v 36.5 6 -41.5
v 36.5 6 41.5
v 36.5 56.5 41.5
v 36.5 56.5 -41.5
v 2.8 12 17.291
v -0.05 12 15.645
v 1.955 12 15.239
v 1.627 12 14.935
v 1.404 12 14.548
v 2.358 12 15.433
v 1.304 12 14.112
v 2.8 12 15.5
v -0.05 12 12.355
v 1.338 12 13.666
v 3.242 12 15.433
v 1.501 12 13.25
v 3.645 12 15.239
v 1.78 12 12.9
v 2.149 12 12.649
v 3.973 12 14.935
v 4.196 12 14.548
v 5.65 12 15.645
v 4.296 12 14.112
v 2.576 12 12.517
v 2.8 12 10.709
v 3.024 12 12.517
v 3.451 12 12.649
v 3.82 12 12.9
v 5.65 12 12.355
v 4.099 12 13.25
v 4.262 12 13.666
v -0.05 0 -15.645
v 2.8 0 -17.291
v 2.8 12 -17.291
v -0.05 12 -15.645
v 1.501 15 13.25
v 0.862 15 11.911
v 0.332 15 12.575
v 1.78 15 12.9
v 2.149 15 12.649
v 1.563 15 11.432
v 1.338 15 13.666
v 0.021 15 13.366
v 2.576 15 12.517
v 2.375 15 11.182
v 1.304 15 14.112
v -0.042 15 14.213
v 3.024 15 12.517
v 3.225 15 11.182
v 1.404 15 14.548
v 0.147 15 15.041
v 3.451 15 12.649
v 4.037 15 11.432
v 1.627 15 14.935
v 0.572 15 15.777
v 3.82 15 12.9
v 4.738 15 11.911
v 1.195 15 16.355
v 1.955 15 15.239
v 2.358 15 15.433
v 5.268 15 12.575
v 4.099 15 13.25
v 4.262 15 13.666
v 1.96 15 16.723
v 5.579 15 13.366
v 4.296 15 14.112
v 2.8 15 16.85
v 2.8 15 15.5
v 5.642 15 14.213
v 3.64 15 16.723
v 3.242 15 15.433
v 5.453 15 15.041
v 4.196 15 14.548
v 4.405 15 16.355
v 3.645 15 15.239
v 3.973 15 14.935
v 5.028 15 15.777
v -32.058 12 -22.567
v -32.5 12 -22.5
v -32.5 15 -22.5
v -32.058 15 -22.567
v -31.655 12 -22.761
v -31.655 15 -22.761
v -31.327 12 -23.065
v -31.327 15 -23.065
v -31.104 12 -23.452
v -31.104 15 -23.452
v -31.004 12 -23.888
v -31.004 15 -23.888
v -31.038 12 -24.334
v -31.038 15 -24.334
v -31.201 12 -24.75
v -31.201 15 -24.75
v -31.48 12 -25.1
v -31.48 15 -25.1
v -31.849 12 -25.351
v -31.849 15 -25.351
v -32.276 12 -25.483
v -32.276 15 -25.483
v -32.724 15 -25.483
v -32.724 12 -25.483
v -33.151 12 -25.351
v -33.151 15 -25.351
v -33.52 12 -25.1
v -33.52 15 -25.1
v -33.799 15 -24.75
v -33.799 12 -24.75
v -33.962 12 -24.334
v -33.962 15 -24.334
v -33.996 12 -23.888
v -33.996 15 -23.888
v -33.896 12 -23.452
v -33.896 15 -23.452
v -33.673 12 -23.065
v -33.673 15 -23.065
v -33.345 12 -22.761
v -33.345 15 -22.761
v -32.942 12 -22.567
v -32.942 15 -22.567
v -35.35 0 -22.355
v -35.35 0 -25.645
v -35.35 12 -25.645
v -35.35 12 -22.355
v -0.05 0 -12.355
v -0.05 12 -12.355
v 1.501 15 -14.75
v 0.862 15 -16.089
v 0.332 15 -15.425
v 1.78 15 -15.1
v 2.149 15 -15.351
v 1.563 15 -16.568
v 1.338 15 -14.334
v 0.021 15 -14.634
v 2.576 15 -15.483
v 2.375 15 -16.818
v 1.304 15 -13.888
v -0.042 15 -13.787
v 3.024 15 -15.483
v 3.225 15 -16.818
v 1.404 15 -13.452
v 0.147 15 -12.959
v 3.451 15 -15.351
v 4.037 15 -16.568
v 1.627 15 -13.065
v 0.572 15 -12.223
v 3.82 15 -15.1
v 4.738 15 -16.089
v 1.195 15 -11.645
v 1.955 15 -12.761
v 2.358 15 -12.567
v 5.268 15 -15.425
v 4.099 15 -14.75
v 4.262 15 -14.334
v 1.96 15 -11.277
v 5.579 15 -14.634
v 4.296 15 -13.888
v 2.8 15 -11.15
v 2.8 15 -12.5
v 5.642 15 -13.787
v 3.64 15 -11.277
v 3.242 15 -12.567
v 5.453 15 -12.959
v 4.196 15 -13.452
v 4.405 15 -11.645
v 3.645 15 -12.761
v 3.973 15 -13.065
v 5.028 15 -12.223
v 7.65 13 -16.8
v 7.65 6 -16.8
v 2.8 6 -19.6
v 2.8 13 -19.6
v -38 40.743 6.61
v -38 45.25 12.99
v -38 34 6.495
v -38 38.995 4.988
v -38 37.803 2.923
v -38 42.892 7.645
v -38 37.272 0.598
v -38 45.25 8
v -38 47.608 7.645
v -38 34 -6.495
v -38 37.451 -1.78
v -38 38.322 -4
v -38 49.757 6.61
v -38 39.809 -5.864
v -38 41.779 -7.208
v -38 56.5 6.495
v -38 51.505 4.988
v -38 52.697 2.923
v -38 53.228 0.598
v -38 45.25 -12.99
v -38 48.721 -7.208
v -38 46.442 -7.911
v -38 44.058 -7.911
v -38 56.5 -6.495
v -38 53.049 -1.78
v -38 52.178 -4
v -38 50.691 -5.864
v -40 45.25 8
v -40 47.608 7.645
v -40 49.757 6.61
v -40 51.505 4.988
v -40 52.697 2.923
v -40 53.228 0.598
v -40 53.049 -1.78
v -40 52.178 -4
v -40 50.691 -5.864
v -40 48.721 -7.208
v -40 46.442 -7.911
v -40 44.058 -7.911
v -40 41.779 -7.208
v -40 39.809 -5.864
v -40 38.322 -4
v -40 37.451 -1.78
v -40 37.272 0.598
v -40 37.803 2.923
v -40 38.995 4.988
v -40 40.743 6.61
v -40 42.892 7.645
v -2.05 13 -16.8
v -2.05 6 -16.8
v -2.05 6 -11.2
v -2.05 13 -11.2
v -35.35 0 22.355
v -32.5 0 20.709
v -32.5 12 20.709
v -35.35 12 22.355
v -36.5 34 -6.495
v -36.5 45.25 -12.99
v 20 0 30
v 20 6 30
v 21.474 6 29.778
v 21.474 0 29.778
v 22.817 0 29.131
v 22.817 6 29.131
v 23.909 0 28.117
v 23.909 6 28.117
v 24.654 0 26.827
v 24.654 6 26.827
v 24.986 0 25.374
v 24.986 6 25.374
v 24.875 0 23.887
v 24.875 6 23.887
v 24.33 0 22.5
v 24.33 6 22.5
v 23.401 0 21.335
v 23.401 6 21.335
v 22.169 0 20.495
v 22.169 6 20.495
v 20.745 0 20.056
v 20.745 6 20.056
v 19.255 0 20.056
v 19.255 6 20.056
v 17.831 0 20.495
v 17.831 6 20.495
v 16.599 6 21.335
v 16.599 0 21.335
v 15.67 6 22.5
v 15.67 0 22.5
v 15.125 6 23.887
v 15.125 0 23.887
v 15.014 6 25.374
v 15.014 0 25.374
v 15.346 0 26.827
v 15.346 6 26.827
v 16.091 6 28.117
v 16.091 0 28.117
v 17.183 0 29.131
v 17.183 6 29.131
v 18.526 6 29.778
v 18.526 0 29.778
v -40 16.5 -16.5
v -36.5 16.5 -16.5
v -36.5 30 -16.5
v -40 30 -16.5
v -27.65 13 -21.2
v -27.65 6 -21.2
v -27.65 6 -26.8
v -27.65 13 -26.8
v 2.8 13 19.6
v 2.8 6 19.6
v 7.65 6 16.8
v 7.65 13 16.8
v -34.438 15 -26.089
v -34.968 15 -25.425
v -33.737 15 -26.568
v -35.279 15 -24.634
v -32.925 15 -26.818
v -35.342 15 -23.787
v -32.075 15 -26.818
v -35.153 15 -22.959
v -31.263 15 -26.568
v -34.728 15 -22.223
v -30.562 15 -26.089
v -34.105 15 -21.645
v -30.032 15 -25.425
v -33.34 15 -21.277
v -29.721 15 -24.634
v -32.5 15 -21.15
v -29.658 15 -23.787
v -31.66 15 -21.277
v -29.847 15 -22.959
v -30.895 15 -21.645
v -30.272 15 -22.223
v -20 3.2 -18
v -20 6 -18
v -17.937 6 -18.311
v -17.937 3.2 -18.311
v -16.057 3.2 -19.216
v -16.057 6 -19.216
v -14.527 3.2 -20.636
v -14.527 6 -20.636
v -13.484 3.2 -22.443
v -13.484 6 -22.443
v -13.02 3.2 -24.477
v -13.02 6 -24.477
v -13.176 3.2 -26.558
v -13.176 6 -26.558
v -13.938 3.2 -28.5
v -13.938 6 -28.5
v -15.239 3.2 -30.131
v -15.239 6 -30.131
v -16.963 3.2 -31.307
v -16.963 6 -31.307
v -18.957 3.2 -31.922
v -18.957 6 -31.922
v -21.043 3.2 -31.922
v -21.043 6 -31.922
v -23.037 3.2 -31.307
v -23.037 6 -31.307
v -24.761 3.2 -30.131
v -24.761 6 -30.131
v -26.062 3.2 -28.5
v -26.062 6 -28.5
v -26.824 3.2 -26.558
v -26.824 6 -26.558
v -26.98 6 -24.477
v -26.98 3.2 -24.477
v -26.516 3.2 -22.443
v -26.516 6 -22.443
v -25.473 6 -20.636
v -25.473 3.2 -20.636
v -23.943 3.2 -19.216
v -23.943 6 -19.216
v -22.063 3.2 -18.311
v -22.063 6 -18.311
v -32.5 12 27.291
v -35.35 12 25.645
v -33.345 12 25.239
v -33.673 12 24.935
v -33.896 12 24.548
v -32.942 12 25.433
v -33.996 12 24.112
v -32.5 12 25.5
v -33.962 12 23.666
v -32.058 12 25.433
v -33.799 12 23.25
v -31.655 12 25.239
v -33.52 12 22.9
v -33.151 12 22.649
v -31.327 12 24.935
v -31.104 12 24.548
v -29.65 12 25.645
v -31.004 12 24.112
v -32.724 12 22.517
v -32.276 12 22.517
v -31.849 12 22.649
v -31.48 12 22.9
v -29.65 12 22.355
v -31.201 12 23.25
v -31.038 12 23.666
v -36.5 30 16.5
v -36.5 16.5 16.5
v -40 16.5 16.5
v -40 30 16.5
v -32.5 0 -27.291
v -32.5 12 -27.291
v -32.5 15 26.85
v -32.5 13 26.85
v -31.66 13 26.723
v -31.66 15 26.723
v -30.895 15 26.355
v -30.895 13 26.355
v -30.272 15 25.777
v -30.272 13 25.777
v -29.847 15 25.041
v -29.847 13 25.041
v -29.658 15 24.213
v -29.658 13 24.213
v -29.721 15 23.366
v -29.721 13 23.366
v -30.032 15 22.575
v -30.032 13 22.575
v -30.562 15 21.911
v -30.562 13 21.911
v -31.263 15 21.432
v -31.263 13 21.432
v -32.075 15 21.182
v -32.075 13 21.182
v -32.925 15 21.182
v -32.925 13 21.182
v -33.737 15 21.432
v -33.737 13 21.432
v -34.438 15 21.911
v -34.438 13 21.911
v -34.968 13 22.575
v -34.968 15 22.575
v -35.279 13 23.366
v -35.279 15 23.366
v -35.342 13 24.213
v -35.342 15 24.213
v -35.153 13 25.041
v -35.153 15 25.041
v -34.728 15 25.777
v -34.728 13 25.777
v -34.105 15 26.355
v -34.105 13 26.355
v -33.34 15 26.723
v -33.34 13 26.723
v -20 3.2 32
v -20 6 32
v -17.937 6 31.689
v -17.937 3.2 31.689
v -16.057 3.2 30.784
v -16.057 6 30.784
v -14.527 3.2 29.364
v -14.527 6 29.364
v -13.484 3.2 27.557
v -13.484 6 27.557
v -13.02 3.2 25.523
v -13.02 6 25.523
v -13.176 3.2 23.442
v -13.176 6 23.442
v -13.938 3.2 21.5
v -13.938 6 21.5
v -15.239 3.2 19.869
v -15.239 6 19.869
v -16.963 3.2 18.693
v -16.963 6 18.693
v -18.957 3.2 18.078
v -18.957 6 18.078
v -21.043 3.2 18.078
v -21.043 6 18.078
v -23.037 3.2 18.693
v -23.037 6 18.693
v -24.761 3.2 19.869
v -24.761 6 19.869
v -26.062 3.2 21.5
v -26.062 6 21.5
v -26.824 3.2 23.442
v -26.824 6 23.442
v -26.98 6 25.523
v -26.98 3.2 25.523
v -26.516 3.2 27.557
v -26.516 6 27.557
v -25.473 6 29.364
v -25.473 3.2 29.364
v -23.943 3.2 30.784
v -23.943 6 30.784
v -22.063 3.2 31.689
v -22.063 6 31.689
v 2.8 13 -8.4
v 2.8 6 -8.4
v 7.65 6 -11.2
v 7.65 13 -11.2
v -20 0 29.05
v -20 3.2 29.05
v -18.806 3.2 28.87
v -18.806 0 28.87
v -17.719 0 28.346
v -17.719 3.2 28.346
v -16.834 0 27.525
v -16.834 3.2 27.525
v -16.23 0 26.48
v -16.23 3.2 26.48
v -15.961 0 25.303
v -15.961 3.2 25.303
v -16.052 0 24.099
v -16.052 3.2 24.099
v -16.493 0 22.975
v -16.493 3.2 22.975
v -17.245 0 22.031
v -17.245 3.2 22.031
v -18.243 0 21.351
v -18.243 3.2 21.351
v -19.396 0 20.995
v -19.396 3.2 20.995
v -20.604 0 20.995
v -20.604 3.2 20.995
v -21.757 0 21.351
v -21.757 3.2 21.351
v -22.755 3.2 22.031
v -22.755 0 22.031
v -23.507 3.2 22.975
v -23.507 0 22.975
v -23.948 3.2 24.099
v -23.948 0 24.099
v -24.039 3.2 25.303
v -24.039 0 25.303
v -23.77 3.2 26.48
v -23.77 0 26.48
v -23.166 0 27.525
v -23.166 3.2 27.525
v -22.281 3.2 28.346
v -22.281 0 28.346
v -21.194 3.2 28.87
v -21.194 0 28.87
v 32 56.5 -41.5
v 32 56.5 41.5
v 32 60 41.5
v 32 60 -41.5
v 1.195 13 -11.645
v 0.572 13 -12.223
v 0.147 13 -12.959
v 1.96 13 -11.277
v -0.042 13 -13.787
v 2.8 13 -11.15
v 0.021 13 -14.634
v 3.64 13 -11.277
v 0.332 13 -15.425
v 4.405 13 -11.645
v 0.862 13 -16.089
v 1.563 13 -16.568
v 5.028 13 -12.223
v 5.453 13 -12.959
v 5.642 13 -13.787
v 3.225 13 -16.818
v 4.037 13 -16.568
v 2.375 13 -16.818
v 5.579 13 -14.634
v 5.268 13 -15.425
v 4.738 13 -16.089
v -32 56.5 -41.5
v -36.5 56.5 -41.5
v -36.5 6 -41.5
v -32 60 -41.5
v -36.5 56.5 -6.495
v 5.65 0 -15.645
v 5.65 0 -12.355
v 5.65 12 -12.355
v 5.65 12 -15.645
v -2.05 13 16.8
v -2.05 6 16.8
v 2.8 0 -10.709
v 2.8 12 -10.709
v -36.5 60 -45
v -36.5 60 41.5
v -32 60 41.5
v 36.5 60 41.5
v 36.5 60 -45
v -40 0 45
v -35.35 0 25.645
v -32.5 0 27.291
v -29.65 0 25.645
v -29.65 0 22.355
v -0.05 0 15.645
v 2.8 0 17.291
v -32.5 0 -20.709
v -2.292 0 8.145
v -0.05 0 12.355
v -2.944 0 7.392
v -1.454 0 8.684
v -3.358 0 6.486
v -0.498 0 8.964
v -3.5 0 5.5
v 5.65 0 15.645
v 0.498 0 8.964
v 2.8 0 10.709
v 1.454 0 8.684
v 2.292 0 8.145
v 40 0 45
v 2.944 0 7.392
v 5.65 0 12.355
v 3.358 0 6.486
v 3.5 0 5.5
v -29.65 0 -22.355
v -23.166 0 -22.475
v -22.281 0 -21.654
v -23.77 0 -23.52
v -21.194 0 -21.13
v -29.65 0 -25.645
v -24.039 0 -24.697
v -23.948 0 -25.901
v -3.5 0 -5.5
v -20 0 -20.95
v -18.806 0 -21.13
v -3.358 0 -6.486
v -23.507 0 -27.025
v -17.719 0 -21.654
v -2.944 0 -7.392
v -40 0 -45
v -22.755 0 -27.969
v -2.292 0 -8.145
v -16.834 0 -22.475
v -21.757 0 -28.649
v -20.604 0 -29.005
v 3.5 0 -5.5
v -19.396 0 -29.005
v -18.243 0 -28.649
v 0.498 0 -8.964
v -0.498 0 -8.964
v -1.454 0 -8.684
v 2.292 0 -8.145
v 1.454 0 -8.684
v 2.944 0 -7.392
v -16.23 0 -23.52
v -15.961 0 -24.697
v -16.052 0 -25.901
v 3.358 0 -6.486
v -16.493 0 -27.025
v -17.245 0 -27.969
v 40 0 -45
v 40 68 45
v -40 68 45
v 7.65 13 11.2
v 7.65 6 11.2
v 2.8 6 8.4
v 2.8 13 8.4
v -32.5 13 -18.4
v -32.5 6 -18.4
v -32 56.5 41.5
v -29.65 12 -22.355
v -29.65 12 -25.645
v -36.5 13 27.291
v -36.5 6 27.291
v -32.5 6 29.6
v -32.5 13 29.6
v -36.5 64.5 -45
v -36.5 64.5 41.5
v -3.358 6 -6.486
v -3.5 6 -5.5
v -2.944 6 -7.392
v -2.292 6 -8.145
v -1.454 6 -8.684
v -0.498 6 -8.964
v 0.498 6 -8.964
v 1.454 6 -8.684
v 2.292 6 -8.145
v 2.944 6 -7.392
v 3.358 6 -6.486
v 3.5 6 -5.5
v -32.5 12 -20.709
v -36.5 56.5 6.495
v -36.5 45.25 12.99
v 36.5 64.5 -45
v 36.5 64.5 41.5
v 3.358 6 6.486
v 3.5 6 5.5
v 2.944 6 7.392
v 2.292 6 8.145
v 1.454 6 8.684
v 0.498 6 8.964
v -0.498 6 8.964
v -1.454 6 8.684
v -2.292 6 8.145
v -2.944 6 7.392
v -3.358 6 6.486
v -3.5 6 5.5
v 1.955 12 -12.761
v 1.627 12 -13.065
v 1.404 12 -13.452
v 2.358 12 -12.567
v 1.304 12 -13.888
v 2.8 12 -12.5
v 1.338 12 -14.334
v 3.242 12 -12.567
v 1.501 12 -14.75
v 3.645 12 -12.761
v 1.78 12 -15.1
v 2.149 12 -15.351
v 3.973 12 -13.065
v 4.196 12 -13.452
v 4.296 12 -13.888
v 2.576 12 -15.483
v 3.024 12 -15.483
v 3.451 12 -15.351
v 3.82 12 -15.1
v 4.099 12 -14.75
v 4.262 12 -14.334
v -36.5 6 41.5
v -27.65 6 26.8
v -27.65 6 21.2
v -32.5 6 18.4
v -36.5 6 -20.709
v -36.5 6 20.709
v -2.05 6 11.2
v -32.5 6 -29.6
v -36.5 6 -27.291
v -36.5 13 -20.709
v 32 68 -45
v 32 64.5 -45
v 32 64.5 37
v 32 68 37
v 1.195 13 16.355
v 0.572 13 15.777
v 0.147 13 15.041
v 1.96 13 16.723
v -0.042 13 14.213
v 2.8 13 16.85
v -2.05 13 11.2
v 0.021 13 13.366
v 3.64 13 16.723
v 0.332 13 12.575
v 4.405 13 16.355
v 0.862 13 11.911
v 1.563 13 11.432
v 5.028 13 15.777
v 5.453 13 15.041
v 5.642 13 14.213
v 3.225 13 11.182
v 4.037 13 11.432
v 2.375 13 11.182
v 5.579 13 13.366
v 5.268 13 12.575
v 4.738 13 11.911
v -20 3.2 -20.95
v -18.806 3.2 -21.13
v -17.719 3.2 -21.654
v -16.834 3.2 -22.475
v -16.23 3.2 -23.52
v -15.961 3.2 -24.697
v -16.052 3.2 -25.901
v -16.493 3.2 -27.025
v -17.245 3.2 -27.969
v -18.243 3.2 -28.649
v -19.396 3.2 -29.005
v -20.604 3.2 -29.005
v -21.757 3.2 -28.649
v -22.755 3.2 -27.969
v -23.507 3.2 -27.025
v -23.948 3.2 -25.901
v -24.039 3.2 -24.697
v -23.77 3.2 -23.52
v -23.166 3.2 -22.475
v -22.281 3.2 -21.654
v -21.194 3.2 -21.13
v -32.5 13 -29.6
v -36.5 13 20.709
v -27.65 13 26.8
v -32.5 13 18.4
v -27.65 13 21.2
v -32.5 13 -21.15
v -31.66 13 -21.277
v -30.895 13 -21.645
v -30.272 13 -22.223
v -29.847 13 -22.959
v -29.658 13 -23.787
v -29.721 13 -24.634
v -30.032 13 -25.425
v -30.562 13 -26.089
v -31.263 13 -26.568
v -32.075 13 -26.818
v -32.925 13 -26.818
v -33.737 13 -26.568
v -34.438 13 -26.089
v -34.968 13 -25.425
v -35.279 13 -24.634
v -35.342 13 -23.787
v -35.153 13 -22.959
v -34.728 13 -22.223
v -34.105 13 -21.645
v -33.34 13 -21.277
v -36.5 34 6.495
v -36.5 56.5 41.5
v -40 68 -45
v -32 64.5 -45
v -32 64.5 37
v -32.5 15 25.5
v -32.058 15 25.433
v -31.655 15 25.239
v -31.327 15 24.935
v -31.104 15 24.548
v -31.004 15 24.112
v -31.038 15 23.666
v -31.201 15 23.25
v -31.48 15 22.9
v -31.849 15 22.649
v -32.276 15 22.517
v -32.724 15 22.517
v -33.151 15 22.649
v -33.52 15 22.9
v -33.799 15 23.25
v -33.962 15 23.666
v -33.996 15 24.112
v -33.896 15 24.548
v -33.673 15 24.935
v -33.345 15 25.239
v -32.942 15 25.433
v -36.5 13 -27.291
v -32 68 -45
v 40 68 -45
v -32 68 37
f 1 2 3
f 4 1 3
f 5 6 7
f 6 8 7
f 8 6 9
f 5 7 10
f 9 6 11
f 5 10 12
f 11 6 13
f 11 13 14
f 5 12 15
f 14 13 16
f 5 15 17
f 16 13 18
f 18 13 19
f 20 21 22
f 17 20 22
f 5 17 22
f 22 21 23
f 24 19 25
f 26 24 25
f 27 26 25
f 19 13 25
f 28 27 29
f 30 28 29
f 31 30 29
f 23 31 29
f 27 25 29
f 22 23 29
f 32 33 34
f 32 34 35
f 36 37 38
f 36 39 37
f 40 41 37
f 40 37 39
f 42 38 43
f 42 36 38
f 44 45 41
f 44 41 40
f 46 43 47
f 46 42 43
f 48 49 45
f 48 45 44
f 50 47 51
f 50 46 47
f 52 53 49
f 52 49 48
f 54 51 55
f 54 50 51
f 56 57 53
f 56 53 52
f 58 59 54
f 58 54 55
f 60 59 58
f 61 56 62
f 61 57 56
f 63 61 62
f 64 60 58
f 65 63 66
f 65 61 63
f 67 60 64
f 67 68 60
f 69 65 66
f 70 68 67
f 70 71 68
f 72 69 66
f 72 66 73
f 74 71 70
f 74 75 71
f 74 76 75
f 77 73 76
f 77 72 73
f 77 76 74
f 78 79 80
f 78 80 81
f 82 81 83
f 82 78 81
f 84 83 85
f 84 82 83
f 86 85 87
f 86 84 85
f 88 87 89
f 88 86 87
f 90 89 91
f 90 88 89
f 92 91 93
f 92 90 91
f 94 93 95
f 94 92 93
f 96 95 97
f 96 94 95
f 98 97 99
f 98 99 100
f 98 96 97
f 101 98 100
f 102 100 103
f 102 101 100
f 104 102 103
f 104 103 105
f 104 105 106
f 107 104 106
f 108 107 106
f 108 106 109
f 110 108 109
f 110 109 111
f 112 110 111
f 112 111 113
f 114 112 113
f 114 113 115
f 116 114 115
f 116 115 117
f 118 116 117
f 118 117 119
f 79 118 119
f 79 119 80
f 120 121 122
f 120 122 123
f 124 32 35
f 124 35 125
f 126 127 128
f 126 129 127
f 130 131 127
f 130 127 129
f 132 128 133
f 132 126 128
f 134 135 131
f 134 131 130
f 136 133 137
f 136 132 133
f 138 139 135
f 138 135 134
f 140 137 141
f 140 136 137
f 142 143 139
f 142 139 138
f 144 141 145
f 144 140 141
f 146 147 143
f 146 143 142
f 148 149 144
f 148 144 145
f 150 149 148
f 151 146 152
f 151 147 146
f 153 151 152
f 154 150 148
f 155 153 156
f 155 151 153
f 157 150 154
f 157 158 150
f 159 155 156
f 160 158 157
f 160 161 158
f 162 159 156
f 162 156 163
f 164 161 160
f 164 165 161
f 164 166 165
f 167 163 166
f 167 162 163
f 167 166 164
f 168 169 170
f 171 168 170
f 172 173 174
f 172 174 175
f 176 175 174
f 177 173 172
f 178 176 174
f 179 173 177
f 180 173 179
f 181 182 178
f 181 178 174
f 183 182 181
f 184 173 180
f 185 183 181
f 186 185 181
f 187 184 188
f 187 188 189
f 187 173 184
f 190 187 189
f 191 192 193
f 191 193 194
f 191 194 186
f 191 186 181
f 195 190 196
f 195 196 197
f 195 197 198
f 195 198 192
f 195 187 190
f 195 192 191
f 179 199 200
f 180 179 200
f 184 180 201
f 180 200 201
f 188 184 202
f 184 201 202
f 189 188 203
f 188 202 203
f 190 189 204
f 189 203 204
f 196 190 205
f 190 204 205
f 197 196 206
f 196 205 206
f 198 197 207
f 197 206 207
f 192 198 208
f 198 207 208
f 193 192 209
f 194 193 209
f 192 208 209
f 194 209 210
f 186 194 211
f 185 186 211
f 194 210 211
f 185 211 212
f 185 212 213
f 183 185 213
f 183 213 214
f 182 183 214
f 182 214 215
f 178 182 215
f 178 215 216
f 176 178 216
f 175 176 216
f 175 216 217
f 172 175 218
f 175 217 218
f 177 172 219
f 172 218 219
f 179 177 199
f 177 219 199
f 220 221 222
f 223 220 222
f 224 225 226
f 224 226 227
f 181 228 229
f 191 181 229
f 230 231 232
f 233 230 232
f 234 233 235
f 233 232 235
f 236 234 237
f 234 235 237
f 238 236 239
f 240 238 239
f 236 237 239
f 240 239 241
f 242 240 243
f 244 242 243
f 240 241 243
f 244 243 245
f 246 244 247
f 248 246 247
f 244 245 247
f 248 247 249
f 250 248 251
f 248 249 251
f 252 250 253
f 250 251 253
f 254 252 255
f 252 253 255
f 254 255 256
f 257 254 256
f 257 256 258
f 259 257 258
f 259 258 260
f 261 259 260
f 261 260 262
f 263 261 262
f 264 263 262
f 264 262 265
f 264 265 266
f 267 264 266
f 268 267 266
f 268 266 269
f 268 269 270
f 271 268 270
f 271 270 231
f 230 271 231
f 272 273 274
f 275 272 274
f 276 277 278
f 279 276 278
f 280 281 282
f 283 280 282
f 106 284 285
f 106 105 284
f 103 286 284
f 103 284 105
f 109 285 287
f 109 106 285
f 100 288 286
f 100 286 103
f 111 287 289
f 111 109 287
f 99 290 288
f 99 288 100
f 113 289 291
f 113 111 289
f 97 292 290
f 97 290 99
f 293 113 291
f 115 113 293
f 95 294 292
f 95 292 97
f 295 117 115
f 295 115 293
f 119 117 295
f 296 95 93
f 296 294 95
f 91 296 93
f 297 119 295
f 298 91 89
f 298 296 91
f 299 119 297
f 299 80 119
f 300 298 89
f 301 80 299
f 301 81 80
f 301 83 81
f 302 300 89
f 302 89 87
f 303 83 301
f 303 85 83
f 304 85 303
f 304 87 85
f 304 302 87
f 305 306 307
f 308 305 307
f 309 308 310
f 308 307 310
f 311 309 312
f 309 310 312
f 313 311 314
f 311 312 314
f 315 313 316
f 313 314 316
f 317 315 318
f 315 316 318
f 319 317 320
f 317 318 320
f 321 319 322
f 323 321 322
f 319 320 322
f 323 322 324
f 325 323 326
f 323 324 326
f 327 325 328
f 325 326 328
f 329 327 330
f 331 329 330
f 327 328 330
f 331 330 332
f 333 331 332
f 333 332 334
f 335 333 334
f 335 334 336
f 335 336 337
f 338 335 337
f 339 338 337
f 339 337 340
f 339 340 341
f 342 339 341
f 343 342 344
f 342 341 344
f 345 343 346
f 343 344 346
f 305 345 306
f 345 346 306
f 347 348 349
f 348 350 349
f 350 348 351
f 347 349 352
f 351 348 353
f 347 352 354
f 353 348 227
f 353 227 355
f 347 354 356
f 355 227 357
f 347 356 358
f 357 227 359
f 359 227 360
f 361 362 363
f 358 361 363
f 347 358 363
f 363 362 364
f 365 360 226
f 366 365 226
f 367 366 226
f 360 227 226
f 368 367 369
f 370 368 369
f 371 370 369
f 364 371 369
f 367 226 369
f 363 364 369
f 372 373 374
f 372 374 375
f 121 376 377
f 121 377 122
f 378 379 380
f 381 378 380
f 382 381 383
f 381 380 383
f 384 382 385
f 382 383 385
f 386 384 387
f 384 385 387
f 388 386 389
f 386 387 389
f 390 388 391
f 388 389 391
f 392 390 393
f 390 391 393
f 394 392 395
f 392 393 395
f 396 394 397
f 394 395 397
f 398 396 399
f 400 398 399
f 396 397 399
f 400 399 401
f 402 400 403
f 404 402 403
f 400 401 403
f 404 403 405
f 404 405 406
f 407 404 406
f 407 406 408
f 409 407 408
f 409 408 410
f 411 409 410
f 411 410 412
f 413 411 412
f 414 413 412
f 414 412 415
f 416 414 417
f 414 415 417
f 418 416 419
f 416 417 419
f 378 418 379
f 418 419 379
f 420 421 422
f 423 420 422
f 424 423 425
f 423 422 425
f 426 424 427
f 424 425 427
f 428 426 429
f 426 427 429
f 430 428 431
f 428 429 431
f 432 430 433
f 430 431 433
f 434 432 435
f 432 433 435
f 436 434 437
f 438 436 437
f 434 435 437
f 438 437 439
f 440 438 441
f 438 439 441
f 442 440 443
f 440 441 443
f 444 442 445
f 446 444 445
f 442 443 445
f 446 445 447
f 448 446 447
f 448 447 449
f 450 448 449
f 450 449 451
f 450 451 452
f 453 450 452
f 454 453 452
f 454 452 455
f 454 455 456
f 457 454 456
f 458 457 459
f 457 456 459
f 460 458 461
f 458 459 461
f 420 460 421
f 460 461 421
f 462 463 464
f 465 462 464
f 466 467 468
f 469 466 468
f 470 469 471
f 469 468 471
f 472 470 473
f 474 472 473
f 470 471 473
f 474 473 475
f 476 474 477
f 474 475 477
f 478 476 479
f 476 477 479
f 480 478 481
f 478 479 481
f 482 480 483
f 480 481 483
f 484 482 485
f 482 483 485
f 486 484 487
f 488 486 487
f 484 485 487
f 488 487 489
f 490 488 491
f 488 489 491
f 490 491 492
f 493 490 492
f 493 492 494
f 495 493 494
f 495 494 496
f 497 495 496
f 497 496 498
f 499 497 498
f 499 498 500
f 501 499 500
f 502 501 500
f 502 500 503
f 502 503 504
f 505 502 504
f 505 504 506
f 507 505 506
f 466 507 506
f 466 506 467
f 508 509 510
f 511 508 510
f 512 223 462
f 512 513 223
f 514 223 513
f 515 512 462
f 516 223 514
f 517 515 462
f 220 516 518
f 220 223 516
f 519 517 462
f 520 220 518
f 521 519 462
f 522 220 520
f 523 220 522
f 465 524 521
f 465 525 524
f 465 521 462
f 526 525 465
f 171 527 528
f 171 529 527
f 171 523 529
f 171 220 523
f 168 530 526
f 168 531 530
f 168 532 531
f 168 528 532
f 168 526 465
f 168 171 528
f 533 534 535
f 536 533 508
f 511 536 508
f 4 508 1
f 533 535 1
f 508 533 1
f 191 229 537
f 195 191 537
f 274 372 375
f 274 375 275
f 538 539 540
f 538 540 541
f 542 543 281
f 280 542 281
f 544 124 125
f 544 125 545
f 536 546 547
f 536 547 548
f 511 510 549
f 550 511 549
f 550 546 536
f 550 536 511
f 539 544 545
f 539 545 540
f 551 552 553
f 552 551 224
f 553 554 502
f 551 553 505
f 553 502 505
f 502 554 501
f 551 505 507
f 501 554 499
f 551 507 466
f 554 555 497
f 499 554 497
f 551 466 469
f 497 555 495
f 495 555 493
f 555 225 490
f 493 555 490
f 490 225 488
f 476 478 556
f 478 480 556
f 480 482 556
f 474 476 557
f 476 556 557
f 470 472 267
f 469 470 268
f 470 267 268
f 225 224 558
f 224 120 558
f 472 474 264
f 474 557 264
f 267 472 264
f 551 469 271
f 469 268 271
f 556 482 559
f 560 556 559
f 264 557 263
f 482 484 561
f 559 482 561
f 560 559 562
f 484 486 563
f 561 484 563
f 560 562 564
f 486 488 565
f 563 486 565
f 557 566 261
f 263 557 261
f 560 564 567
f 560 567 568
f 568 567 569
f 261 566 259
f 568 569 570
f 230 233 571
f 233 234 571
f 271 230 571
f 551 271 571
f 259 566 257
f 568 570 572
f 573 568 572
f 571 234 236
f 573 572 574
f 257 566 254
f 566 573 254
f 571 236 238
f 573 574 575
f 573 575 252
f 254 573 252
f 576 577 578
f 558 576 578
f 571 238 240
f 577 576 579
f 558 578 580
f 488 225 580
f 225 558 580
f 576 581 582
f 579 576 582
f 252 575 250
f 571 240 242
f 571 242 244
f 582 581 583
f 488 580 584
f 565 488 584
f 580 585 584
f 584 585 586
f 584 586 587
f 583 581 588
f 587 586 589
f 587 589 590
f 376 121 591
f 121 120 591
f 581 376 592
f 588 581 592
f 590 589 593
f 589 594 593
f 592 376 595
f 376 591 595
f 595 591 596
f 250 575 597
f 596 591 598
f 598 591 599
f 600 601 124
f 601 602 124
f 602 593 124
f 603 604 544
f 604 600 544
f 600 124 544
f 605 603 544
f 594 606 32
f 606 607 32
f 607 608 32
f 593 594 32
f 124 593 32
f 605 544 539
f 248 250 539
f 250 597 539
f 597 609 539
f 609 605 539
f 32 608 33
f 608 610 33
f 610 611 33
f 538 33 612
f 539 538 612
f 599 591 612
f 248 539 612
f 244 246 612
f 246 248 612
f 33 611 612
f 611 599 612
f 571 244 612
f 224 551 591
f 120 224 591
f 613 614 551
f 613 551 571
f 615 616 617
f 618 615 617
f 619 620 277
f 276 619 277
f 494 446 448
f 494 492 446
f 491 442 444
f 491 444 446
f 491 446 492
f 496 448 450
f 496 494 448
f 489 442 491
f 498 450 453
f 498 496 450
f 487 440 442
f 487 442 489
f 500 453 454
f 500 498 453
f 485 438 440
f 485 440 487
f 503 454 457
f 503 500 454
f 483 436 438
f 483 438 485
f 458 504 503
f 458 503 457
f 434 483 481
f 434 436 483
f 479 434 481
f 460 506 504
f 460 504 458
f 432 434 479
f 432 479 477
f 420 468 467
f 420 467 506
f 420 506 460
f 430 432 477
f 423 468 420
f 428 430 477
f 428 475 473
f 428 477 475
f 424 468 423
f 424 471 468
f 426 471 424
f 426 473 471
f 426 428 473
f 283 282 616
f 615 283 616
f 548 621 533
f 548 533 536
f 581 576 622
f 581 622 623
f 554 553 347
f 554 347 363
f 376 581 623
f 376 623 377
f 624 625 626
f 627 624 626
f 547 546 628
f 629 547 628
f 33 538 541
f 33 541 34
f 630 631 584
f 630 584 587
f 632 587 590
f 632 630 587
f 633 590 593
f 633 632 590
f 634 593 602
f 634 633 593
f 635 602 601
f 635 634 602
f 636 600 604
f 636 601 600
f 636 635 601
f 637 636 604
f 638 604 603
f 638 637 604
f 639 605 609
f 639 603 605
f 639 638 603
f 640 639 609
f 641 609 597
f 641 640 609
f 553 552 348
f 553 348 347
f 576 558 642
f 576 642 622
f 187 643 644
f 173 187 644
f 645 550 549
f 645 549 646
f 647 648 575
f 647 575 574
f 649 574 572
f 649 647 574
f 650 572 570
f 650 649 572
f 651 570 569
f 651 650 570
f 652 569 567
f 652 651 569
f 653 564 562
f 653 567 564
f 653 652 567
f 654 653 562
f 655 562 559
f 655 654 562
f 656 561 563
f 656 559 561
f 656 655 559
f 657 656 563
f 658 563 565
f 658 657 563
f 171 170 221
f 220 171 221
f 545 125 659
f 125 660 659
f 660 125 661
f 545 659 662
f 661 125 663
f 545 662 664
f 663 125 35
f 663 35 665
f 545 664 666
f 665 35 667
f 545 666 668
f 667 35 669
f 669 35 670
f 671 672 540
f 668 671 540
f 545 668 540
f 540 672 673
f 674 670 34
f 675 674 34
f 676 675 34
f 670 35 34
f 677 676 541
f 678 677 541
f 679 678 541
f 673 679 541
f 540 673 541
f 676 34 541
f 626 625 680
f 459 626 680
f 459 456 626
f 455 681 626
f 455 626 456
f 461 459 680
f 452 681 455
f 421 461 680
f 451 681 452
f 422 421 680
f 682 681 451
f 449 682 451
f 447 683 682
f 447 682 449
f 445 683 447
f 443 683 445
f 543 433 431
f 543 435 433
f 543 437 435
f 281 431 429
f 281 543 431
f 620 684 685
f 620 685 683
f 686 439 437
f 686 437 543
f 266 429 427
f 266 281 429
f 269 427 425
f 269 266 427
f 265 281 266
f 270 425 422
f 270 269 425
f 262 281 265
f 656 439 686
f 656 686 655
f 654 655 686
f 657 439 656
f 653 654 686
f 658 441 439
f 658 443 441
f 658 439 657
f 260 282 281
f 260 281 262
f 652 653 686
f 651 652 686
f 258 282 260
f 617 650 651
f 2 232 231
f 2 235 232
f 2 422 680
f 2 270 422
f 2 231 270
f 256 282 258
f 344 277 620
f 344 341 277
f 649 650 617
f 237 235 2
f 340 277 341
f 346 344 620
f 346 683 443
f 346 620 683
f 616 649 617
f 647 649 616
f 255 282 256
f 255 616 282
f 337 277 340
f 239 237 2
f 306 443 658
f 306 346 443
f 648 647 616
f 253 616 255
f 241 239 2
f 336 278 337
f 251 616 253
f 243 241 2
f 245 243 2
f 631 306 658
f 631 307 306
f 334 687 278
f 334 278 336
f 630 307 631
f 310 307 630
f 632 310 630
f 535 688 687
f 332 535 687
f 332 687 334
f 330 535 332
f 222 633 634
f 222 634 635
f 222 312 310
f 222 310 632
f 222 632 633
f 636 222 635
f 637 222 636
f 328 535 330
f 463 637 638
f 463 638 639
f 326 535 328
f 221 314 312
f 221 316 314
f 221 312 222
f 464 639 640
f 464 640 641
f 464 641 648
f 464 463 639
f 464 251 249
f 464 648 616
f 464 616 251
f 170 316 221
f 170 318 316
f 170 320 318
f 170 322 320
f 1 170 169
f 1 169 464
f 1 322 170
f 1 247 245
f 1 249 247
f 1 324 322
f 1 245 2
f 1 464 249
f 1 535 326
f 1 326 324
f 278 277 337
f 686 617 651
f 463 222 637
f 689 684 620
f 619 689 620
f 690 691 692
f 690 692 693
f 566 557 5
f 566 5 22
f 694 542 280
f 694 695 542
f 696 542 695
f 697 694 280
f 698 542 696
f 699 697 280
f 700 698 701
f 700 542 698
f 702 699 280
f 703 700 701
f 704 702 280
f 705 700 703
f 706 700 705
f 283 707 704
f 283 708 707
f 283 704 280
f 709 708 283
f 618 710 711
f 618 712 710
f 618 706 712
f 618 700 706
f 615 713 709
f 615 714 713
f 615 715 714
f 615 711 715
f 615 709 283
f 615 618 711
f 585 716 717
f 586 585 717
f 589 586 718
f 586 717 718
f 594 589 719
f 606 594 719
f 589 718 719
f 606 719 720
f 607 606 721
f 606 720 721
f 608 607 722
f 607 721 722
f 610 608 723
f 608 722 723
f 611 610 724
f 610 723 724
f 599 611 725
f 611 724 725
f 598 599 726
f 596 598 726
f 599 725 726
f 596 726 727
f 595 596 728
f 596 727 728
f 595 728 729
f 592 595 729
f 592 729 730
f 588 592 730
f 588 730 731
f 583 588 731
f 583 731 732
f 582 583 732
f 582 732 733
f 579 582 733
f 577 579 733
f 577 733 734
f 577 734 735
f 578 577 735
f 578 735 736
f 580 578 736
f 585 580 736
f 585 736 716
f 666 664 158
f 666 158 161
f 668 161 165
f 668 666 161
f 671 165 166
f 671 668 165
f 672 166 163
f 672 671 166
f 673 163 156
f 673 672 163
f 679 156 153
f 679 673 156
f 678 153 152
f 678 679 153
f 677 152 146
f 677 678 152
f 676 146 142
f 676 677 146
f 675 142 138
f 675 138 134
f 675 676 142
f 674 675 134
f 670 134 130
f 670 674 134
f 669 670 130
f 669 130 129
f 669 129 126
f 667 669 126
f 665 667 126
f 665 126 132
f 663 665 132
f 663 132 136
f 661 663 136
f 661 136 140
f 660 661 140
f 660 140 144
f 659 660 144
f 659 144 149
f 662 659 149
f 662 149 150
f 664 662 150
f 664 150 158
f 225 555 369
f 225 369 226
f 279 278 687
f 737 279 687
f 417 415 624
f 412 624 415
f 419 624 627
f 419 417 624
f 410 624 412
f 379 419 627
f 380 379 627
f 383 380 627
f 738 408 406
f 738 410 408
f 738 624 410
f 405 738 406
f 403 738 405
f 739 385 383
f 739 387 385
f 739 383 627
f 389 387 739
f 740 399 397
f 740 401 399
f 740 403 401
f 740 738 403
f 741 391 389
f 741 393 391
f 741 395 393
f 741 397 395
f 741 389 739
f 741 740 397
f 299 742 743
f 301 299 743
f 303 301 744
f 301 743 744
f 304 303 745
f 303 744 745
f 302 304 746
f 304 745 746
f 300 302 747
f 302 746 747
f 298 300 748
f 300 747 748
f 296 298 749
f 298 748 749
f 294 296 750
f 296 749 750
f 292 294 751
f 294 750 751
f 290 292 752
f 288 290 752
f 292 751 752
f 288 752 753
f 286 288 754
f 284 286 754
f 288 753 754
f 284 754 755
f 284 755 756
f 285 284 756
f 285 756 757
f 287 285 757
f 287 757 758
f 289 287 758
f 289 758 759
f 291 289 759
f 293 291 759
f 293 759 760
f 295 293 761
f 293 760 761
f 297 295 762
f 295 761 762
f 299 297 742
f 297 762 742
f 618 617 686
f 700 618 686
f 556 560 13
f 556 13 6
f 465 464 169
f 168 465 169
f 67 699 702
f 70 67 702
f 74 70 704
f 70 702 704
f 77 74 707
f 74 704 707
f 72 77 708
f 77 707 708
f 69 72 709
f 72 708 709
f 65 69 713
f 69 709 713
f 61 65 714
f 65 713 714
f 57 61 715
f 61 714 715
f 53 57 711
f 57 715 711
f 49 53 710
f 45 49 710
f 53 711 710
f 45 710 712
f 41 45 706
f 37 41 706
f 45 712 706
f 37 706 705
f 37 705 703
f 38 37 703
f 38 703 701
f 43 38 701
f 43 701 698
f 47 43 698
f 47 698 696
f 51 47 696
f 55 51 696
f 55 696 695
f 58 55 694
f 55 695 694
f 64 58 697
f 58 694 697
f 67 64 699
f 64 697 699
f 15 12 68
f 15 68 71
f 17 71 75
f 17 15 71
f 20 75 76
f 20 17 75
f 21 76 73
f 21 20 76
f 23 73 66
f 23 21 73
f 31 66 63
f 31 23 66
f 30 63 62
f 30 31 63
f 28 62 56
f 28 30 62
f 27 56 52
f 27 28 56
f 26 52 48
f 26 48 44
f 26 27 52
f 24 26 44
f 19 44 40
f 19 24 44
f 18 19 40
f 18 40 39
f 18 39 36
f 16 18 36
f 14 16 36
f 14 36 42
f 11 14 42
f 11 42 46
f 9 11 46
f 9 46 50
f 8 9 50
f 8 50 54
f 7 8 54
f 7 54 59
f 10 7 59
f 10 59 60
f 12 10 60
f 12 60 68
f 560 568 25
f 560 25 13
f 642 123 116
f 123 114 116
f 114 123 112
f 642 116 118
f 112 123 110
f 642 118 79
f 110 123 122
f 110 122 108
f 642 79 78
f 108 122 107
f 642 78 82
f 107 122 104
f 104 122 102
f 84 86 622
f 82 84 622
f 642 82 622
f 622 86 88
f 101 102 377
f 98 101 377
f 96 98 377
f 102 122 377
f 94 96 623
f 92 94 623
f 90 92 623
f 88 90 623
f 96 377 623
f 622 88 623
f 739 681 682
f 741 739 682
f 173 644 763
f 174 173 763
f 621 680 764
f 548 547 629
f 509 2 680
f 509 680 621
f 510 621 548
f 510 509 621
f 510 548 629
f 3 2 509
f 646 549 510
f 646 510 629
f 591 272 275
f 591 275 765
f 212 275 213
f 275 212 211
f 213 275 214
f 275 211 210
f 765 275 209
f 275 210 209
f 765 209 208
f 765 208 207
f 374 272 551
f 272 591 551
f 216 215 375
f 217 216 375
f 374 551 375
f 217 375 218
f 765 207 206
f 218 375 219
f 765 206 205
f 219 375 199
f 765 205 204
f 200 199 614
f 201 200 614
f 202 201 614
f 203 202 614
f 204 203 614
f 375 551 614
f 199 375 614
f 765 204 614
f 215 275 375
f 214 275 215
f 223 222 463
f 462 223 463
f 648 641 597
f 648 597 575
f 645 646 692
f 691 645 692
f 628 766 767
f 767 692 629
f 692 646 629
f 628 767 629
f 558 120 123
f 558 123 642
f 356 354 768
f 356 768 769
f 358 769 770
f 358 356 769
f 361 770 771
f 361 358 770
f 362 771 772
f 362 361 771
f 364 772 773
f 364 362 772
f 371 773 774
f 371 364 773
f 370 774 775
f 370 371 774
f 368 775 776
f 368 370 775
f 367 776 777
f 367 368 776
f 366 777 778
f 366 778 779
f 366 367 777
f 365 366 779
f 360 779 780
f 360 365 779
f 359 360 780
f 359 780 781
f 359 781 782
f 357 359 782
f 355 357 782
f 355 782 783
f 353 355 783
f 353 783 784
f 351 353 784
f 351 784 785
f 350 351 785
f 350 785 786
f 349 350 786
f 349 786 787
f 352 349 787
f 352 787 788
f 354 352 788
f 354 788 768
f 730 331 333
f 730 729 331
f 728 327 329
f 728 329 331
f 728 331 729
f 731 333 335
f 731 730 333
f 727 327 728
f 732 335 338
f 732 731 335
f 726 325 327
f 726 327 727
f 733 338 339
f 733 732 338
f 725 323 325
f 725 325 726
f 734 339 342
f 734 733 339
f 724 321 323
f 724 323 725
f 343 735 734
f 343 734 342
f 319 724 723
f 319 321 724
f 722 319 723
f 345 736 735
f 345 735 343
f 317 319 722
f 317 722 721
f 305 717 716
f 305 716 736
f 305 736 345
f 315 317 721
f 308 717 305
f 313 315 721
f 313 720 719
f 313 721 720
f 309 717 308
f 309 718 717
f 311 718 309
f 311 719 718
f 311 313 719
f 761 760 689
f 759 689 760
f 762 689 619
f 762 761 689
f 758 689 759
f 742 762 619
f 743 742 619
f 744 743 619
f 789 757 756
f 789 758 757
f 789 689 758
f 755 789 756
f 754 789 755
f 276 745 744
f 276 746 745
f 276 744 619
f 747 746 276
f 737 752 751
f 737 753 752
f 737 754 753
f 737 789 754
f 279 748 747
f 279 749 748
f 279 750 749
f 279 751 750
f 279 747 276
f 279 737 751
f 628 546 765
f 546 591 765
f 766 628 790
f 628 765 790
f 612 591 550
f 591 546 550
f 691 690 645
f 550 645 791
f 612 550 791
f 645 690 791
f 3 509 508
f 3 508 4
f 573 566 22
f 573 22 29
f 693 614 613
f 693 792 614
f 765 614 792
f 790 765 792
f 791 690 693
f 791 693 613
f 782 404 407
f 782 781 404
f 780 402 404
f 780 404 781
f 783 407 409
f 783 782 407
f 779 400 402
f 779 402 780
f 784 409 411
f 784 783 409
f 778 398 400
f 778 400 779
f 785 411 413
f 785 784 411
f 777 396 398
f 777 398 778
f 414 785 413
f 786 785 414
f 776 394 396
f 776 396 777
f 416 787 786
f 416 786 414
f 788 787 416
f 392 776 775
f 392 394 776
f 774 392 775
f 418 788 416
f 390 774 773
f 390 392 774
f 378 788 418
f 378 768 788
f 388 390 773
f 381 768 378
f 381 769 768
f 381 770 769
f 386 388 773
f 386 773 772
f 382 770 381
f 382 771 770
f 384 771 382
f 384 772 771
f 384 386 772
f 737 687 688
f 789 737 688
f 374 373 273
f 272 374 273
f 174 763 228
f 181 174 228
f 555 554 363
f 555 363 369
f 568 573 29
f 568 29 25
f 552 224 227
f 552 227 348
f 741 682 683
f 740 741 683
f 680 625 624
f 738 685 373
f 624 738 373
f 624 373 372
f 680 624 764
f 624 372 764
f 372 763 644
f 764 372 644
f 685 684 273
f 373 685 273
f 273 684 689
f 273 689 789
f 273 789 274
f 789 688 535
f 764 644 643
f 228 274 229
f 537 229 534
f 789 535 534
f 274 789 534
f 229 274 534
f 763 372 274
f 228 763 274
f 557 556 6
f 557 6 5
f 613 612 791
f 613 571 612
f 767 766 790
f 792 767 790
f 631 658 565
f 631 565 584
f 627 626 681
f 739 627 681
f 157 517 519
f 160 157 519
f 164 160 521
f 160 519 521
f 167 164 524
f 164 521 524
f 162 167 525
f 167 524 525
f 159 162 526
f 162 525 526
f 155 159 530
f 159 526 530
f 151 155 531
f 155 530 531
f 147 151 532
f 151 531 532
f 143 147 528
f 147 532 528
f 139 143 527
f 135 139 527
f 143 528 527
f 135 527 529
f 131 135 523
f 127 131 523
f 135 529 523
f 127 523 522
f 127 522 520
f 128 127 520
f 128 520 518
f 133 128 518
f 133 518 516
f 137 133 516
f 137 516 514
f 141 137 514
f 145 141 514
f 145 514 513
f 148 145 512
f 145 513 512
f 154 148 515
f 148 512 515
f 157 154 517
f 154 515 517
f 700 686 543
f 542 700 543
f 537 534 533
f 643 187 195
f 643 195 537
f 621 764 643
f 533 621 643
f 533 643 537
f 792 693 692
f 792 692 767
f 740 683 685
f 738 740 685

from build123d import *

# Parameters (mm, degrees)
SKETCH1_W               = 80
SKETCH1_H               = 90
BOSS_EXTRUDE1_DEPTH     = 6
SKETCH4_W               = 80
SKETCH4_H               = 90
SKETCH4_W_2             = 73
SKETCH4_H_2             = 83
BOSS_EXTRUDE2_DEPTH     = 54
SKETCH6_R               = 4.05
SKETCH6_R_2             = 5
CUT_EXTRUDE1_DEPTH      = 40
SKETCH7_R               = 7
CUT_EXTRUDE2_DEPTH      = 2.8
BOSS_EXTRUDE3_DEPTH     = 7
SKETCH11_R              = 2.85
BOSS_EXTRUDE4_DEPTH     = 2
CUT_EXTRUDE3_DEPTH      = 9
CUT_EXTRUDE3_DEPTH_BACK = 6
SKETCH5_R               = 1.5
CUT_EXTRUDE4_DEPTH      = 6
CUT_EXTRUDE4_DEPTH_BACK = 81.876448982
SKETCH12_W              = 33
SKETCH12_H              = 13.5
CUT_EXTRUDE6_DEPTH      = 3.5
SKETCH17_R              = 8
CUT_EXTRUDE8_DEPTH      = 2
CUT_EXTRUDE9_DEPTH      = 1.5
CUT_EXTRUDE10_DEPTH     = 10
BOSS_EXTRUDE5_DEPTH     = 90
BOSS_EXTRUDE5_2_DEPTH   = 90
SKETCH21_W              = 3.5
SKETCH21_H              = 8
BOSS_EXTRUDE6_DEPTH     = 80
SKETCH22_W              = 80
SKETCH22_H              = 3.5
BOSS_EXTRUDE7_DEPTH     = 4.5
SKETCH24_W              = 8
SKETCH24_H              = 3.5
BOSS_EXTRUDE8_DEPTH     = 90


with BuildPart() as part:
    # Sketch1 → Boss-Extrude1 (new body)
    with BuildSketch(Plane(origin=(0, 0, 0), x_dir=(1, 0, 0), z_dir=(0, 1, 0))):
        Rectangle(SKETCH1_W, SKETCH1_H)
    extrude(amount=BOSS_EXTRUDE1_DEPTH)

    # Sketch4 → Boss-Extrude2 (add)
    with BuildSketch(Plane(origin=(0, 6, 0), x_dir=(1, 0, 0), z_dir=(0, 1, 0))):
        Rectangle(SKETCH4_W, SKETCH4_H)
        Rectangle(SKETCH4_W_2, SKETCH4_H_2, mode=Mode.SUBTRACT)
    extrude(amount=BOSS_EXTRUDE2_DEPTH)

    # Sketch6 → Cut-Extrude1 (cut)
    with BuildSketch(Plane(origin=(0, 6, 0), x_dir=(1, 0, 0), z_dir=(0, 1, 0))):
        with Locations(Location((-20, 25, 0), (0, 0, 270))):
            Circle(SKETCH6_R)
        with Locations(Location((-20, -25, 0), (0, 0, 270))):
            Circle(SKETCH6_R)
        with Locations(Location((20, -25, 0), (0, 0, 270))):
            Circle(SKETCH6_R_2)
    extrude(amount=-CUT_EXTRUDE1_DEPTH, mode=Mode.SUBTRACT)

    # Sketch7 → Cut-Extrude2 (cut)
    with BuildSketch(Plane(origin=(0, 6, 0), x_dir=(1, 0, 0), z_dir=(0, 1, 0))):
        with Locations(Location((-20, 25, 0), (0, 0, 270))):
            Circle(SKETCH7_R)
        with Locations(Location((-20, -25, 0), (0, 0, 270))):
            Circle(SKETCH7_R)
    extrude(amount=-CUT_EXTRUDE2_DEPTH, mode=Mode.SUBTRACT)

    # Sketch10 → Boss-Extrude3 (add)
    with BuildSketch(Plane(origin=(0, 6, 0), x_dir=(1, 0, 0), z_dir=(0, 1, 0))):
        Polygon((-32.5, 29.600297611), (-37.35, 26.800148806), (-37.35, 21.199851194), (-32.5, 18.399702389), (-27.65, 21.199851194), (-27.65, 26.800148806), align=None)
        Polygon((2.8, 19.600297611), (-2.05, 16.800148806), (-2.05, 11.199851194), (2.8, 8.399702389), (7.65, 11.199851194), (7.65, 16.800148806), align=None)
        Polygon((2.8, -8.399702389), (-2.05, -11.199851194), (-2.05, -16.800148806), (2.8, -19.600297611), (7.65, -16.800148806), (7.65, -11.199851194), align=None)
        Polygon((-27.65, -21.199851194), (-32.5, -18.399702389), (-37.35, -21.199851194), (-37.35, -26.800148806), (-32.5, -29.600297611), (-27.65, -26.800148806), align=None)
    extrude(amount=BOSS_EXTRUDE3_DEPTH)

    # Sketch11 → Boss-Extrude4 (add)
    with BuildSketch(Plane(origin=(0, 13, 0), x_dir=(1, 0, 0), z_dir=(0, 1, 0))):
        with Locations(Location((-32.5, 24, 0), (0, 0, 270))):
            Circle(SKETCH11_R)
        with Locations(Location((2.8, 14, 0), (0, 0, 270))):
            Circle(SKETCH11_R)
        with Locations(Location((2.8, -14, 0), (0, 0, 270))):
            Circle(SKETCH11_R)
        with Locations(Location((-32.5, -24, 0), (0, 0, 270))):
            Circle(SKETCH11_R)
    extrude(amount=BOSS_EXTRUDE4_DEPTH)

    # Sketch5 → Cut-Extrude3 (cut, two sides: drawn at the far end of the back side and taken through both)
    with BuildSketch(Plane(origin=(0, 6, 0), x_dir=(1, 0, 0), z_dir=(0, 1, 0)).offset(-CUT_EXTRUDE3_DEPTH_BACK)):
        with Locations(Location((-32.5, 24, 0), (0, 0, 270))):
            Circle(SKETCH5_R)
        with Locations(Location((-32.5, -24, 0), (0, 0, 270))):
            Circle(SKETCH5_R)
        with Locations(Location((2.8, 14, 0), (0, 0, 270))):
            Circle(SKETCH5_R)
        with Locations(Location((2.8, -14, 0), (0, 0, 270))):
            Circle(SKETCH5_R)
    extrude(amount=CUT_EXTRUDE3_DEPTH + CUT_EXTRUDE3_DEPTH_BACK, mode=Mode.SUBTRACT)

    # Sketch8 → Cut-Extrude4 (cut, two sides: drawn at the far end of the back side and taken through both)
    with BuildSketch(Plane(origin=(0, 6, 0), x_dir=(1, 0, 0), z_dir=(0, 1, 0)).offset(-CUT_EXTRUDE4_DEPTH_BACK)):
        Polygon((-29.65, 25.645448267), (-32.5, 27.290896534), (-35.35, 25.645448267), (-35.35, 22.354551733), (-32.5, 20.709103466), (-29.65, 22.354551733), align=None)
        Polygon((-29.65, -22.354551733), (-32.5, -20.709103466), (-35.35, -22.354551733), (-35.35, -25.645448267), (-32.5, -27.290896534), (-29.65, -25.645448267), align=None)
        Polygon((5.65, -12.354551733), (2.8, -10.709103466), (-0.05, -12.354551733), (-0.05, -15.645448267), (2.8, -17.290896534), (5.65, -15.645448267), align=None)
        Polygon((5.65, 15.645448267), (2.8, 17.290896534), (-0.05, 15.645448267), (-0.05, 12.354551733), (2.8, 10.709103466), (5.65, 12.354551733), align=None)
    extrude(amount=CUT_EXTRUDE4_DEPTH + CUT_EXTRUDE4_DEPTH_BACK, mode=Mode.SUBTRACT)

    # Sketch12 → Cut-Extrude6 (cut)
    with BuildSketch(Plane(origin=(-36.5, 0, 0), x_dir=(0, 0, -1), z_dir=(1, 0, 0))):
        with Locations((0, 23.25)):
            Rectangle(SKETCH12_W, SKETCH12_H)
    extrude(amount=-CUT_EXTRUDE6_DEPTH, mode=Mode.SUBTRACT)

    # Sketch17 → Cut-Extrude8 (cut)
    with BuildSketch(Plane.ZY.offset(40)):
        with Locations((0, 45.25)):
            Circle(SKETCH17_R)
    extrude(amount=-CUT_EXTRUDE8_DEPTH, mode=Mode.SUBTRACT)

    # Sketch15 → Cut-Extrude9 (cut)
    with BuildSketch(Plane(origin=(-36.5, 0, 0), x_dir=(0, 0, -1), z_dir=(1, 0, 0))):
        Polygon((-6.495190528, 56.5), (-12.990381057, 45.25), (-6.495190528, 34), (6.495190528, 34), (12.990381057, 45.25), (6.495190528, 56.5), align=None)
    extrude(amount=-CUT_EXTRUDE9_DEPTH, mode=Mode.SUBTRACT)

    # Sketch19 → Cut-Extrude10 (cut)
    with BuildSketch(Plane(origin=(0, 6, 0), x_dir=(1, 0, 0), z_dir=(0, 1, 0))):
        with BuildLine():
            Line((-3.5, -5.5), (-3.5, 5.5))
            ThreePointArc((-3.5, 5.5), (0, 9), (3.5, 5.5))
            Line((3.5, 5.5), (3.5, -5.5))
            ThreePointArc((3.5, -5.5), (0, -9), (-3.5, -5.5))
        make_face()
    extrude(amount=-CUT_EXTRUDE10_DEPTH, mode=Mode.SUBTRACT)



with BuildPart() as body_2:
    # Sketch20 → Boss-Extrude5 (new body)
    with BuildSketch(Plane(origin=(0, 0, -45), x_dir=(-1, 0, 0), z_dir=(0, 0, -1))):
        Polygon((-40, 60), (-36.5, 60), (-36.5, 64.5), (-32, 64.5), (-32, 68), (-40, 68), align=None)
    extrude(amount=-BOSS_EXTRUDE5_DEPTH)


with BuildPart() as body_3:
    # Sketch20 → Boss-Extrude5 2 (new body)
    with BuildSketch(Plane(origin=(0, 0, -45), x_dir=(-1, 0, 0), z_dir=(0, 0, -1))):
        Polygon((40, 60), (36.5, 60), (36.5, 64.5), (32, 64.5), (32, 68), (40, 68), align=None)
    extrude(amount=-BOSS_EXTRUDE5_2_DEPTH)


with BuildPart() as part_1:
    add(part.part)

    add(body_2.part)  # Boss-Extrude6 merges body 2
    # Sketch21 → Boss-Extrude6 (add)
    with BuildSketch(Plane(origin=(40, 0, 0), x_dir=(0, 0, -1), z_dir=(1, 0, 0))):
        with Locations((-43.25, 64)):
            Rectangle(SKETCH21_W, SKETCH21_H)
    extrude(amount=-BOSS_EXTRUDE6_DEPTH)


    add(body_3.part)  # Boss-Extrude7 merges body 3
    # Sketch22 → Boss-Extrude7 (add)
    with BuildSketch(Plane(origin=(0, 0, 41.5), x_dir=(-1, 0, 0), z_dir=(0, 0, -1))):
        with Locations((0, 66.25)):
            Rectangle(SKETCH22_W, SKETCH22_H)
    extrude(amount=BOSS_EXTRUDE7_DEPTH)

    # Sketch24 → Boss-Extrude8 (add)
    with BuildSketch(Plane.XY.offset(45)):
        with Locations((-36, 58.25)):
            Rectangle(SKETCH24_W, SKETCH24_H)
        with Locations((36, 58.25)):
            Rectangle(SKETCH24_W, SKETCH24_H)
    extrude(amount=-BOSS_EXTRUDE8_DEPTH)


solid = part_1.part
